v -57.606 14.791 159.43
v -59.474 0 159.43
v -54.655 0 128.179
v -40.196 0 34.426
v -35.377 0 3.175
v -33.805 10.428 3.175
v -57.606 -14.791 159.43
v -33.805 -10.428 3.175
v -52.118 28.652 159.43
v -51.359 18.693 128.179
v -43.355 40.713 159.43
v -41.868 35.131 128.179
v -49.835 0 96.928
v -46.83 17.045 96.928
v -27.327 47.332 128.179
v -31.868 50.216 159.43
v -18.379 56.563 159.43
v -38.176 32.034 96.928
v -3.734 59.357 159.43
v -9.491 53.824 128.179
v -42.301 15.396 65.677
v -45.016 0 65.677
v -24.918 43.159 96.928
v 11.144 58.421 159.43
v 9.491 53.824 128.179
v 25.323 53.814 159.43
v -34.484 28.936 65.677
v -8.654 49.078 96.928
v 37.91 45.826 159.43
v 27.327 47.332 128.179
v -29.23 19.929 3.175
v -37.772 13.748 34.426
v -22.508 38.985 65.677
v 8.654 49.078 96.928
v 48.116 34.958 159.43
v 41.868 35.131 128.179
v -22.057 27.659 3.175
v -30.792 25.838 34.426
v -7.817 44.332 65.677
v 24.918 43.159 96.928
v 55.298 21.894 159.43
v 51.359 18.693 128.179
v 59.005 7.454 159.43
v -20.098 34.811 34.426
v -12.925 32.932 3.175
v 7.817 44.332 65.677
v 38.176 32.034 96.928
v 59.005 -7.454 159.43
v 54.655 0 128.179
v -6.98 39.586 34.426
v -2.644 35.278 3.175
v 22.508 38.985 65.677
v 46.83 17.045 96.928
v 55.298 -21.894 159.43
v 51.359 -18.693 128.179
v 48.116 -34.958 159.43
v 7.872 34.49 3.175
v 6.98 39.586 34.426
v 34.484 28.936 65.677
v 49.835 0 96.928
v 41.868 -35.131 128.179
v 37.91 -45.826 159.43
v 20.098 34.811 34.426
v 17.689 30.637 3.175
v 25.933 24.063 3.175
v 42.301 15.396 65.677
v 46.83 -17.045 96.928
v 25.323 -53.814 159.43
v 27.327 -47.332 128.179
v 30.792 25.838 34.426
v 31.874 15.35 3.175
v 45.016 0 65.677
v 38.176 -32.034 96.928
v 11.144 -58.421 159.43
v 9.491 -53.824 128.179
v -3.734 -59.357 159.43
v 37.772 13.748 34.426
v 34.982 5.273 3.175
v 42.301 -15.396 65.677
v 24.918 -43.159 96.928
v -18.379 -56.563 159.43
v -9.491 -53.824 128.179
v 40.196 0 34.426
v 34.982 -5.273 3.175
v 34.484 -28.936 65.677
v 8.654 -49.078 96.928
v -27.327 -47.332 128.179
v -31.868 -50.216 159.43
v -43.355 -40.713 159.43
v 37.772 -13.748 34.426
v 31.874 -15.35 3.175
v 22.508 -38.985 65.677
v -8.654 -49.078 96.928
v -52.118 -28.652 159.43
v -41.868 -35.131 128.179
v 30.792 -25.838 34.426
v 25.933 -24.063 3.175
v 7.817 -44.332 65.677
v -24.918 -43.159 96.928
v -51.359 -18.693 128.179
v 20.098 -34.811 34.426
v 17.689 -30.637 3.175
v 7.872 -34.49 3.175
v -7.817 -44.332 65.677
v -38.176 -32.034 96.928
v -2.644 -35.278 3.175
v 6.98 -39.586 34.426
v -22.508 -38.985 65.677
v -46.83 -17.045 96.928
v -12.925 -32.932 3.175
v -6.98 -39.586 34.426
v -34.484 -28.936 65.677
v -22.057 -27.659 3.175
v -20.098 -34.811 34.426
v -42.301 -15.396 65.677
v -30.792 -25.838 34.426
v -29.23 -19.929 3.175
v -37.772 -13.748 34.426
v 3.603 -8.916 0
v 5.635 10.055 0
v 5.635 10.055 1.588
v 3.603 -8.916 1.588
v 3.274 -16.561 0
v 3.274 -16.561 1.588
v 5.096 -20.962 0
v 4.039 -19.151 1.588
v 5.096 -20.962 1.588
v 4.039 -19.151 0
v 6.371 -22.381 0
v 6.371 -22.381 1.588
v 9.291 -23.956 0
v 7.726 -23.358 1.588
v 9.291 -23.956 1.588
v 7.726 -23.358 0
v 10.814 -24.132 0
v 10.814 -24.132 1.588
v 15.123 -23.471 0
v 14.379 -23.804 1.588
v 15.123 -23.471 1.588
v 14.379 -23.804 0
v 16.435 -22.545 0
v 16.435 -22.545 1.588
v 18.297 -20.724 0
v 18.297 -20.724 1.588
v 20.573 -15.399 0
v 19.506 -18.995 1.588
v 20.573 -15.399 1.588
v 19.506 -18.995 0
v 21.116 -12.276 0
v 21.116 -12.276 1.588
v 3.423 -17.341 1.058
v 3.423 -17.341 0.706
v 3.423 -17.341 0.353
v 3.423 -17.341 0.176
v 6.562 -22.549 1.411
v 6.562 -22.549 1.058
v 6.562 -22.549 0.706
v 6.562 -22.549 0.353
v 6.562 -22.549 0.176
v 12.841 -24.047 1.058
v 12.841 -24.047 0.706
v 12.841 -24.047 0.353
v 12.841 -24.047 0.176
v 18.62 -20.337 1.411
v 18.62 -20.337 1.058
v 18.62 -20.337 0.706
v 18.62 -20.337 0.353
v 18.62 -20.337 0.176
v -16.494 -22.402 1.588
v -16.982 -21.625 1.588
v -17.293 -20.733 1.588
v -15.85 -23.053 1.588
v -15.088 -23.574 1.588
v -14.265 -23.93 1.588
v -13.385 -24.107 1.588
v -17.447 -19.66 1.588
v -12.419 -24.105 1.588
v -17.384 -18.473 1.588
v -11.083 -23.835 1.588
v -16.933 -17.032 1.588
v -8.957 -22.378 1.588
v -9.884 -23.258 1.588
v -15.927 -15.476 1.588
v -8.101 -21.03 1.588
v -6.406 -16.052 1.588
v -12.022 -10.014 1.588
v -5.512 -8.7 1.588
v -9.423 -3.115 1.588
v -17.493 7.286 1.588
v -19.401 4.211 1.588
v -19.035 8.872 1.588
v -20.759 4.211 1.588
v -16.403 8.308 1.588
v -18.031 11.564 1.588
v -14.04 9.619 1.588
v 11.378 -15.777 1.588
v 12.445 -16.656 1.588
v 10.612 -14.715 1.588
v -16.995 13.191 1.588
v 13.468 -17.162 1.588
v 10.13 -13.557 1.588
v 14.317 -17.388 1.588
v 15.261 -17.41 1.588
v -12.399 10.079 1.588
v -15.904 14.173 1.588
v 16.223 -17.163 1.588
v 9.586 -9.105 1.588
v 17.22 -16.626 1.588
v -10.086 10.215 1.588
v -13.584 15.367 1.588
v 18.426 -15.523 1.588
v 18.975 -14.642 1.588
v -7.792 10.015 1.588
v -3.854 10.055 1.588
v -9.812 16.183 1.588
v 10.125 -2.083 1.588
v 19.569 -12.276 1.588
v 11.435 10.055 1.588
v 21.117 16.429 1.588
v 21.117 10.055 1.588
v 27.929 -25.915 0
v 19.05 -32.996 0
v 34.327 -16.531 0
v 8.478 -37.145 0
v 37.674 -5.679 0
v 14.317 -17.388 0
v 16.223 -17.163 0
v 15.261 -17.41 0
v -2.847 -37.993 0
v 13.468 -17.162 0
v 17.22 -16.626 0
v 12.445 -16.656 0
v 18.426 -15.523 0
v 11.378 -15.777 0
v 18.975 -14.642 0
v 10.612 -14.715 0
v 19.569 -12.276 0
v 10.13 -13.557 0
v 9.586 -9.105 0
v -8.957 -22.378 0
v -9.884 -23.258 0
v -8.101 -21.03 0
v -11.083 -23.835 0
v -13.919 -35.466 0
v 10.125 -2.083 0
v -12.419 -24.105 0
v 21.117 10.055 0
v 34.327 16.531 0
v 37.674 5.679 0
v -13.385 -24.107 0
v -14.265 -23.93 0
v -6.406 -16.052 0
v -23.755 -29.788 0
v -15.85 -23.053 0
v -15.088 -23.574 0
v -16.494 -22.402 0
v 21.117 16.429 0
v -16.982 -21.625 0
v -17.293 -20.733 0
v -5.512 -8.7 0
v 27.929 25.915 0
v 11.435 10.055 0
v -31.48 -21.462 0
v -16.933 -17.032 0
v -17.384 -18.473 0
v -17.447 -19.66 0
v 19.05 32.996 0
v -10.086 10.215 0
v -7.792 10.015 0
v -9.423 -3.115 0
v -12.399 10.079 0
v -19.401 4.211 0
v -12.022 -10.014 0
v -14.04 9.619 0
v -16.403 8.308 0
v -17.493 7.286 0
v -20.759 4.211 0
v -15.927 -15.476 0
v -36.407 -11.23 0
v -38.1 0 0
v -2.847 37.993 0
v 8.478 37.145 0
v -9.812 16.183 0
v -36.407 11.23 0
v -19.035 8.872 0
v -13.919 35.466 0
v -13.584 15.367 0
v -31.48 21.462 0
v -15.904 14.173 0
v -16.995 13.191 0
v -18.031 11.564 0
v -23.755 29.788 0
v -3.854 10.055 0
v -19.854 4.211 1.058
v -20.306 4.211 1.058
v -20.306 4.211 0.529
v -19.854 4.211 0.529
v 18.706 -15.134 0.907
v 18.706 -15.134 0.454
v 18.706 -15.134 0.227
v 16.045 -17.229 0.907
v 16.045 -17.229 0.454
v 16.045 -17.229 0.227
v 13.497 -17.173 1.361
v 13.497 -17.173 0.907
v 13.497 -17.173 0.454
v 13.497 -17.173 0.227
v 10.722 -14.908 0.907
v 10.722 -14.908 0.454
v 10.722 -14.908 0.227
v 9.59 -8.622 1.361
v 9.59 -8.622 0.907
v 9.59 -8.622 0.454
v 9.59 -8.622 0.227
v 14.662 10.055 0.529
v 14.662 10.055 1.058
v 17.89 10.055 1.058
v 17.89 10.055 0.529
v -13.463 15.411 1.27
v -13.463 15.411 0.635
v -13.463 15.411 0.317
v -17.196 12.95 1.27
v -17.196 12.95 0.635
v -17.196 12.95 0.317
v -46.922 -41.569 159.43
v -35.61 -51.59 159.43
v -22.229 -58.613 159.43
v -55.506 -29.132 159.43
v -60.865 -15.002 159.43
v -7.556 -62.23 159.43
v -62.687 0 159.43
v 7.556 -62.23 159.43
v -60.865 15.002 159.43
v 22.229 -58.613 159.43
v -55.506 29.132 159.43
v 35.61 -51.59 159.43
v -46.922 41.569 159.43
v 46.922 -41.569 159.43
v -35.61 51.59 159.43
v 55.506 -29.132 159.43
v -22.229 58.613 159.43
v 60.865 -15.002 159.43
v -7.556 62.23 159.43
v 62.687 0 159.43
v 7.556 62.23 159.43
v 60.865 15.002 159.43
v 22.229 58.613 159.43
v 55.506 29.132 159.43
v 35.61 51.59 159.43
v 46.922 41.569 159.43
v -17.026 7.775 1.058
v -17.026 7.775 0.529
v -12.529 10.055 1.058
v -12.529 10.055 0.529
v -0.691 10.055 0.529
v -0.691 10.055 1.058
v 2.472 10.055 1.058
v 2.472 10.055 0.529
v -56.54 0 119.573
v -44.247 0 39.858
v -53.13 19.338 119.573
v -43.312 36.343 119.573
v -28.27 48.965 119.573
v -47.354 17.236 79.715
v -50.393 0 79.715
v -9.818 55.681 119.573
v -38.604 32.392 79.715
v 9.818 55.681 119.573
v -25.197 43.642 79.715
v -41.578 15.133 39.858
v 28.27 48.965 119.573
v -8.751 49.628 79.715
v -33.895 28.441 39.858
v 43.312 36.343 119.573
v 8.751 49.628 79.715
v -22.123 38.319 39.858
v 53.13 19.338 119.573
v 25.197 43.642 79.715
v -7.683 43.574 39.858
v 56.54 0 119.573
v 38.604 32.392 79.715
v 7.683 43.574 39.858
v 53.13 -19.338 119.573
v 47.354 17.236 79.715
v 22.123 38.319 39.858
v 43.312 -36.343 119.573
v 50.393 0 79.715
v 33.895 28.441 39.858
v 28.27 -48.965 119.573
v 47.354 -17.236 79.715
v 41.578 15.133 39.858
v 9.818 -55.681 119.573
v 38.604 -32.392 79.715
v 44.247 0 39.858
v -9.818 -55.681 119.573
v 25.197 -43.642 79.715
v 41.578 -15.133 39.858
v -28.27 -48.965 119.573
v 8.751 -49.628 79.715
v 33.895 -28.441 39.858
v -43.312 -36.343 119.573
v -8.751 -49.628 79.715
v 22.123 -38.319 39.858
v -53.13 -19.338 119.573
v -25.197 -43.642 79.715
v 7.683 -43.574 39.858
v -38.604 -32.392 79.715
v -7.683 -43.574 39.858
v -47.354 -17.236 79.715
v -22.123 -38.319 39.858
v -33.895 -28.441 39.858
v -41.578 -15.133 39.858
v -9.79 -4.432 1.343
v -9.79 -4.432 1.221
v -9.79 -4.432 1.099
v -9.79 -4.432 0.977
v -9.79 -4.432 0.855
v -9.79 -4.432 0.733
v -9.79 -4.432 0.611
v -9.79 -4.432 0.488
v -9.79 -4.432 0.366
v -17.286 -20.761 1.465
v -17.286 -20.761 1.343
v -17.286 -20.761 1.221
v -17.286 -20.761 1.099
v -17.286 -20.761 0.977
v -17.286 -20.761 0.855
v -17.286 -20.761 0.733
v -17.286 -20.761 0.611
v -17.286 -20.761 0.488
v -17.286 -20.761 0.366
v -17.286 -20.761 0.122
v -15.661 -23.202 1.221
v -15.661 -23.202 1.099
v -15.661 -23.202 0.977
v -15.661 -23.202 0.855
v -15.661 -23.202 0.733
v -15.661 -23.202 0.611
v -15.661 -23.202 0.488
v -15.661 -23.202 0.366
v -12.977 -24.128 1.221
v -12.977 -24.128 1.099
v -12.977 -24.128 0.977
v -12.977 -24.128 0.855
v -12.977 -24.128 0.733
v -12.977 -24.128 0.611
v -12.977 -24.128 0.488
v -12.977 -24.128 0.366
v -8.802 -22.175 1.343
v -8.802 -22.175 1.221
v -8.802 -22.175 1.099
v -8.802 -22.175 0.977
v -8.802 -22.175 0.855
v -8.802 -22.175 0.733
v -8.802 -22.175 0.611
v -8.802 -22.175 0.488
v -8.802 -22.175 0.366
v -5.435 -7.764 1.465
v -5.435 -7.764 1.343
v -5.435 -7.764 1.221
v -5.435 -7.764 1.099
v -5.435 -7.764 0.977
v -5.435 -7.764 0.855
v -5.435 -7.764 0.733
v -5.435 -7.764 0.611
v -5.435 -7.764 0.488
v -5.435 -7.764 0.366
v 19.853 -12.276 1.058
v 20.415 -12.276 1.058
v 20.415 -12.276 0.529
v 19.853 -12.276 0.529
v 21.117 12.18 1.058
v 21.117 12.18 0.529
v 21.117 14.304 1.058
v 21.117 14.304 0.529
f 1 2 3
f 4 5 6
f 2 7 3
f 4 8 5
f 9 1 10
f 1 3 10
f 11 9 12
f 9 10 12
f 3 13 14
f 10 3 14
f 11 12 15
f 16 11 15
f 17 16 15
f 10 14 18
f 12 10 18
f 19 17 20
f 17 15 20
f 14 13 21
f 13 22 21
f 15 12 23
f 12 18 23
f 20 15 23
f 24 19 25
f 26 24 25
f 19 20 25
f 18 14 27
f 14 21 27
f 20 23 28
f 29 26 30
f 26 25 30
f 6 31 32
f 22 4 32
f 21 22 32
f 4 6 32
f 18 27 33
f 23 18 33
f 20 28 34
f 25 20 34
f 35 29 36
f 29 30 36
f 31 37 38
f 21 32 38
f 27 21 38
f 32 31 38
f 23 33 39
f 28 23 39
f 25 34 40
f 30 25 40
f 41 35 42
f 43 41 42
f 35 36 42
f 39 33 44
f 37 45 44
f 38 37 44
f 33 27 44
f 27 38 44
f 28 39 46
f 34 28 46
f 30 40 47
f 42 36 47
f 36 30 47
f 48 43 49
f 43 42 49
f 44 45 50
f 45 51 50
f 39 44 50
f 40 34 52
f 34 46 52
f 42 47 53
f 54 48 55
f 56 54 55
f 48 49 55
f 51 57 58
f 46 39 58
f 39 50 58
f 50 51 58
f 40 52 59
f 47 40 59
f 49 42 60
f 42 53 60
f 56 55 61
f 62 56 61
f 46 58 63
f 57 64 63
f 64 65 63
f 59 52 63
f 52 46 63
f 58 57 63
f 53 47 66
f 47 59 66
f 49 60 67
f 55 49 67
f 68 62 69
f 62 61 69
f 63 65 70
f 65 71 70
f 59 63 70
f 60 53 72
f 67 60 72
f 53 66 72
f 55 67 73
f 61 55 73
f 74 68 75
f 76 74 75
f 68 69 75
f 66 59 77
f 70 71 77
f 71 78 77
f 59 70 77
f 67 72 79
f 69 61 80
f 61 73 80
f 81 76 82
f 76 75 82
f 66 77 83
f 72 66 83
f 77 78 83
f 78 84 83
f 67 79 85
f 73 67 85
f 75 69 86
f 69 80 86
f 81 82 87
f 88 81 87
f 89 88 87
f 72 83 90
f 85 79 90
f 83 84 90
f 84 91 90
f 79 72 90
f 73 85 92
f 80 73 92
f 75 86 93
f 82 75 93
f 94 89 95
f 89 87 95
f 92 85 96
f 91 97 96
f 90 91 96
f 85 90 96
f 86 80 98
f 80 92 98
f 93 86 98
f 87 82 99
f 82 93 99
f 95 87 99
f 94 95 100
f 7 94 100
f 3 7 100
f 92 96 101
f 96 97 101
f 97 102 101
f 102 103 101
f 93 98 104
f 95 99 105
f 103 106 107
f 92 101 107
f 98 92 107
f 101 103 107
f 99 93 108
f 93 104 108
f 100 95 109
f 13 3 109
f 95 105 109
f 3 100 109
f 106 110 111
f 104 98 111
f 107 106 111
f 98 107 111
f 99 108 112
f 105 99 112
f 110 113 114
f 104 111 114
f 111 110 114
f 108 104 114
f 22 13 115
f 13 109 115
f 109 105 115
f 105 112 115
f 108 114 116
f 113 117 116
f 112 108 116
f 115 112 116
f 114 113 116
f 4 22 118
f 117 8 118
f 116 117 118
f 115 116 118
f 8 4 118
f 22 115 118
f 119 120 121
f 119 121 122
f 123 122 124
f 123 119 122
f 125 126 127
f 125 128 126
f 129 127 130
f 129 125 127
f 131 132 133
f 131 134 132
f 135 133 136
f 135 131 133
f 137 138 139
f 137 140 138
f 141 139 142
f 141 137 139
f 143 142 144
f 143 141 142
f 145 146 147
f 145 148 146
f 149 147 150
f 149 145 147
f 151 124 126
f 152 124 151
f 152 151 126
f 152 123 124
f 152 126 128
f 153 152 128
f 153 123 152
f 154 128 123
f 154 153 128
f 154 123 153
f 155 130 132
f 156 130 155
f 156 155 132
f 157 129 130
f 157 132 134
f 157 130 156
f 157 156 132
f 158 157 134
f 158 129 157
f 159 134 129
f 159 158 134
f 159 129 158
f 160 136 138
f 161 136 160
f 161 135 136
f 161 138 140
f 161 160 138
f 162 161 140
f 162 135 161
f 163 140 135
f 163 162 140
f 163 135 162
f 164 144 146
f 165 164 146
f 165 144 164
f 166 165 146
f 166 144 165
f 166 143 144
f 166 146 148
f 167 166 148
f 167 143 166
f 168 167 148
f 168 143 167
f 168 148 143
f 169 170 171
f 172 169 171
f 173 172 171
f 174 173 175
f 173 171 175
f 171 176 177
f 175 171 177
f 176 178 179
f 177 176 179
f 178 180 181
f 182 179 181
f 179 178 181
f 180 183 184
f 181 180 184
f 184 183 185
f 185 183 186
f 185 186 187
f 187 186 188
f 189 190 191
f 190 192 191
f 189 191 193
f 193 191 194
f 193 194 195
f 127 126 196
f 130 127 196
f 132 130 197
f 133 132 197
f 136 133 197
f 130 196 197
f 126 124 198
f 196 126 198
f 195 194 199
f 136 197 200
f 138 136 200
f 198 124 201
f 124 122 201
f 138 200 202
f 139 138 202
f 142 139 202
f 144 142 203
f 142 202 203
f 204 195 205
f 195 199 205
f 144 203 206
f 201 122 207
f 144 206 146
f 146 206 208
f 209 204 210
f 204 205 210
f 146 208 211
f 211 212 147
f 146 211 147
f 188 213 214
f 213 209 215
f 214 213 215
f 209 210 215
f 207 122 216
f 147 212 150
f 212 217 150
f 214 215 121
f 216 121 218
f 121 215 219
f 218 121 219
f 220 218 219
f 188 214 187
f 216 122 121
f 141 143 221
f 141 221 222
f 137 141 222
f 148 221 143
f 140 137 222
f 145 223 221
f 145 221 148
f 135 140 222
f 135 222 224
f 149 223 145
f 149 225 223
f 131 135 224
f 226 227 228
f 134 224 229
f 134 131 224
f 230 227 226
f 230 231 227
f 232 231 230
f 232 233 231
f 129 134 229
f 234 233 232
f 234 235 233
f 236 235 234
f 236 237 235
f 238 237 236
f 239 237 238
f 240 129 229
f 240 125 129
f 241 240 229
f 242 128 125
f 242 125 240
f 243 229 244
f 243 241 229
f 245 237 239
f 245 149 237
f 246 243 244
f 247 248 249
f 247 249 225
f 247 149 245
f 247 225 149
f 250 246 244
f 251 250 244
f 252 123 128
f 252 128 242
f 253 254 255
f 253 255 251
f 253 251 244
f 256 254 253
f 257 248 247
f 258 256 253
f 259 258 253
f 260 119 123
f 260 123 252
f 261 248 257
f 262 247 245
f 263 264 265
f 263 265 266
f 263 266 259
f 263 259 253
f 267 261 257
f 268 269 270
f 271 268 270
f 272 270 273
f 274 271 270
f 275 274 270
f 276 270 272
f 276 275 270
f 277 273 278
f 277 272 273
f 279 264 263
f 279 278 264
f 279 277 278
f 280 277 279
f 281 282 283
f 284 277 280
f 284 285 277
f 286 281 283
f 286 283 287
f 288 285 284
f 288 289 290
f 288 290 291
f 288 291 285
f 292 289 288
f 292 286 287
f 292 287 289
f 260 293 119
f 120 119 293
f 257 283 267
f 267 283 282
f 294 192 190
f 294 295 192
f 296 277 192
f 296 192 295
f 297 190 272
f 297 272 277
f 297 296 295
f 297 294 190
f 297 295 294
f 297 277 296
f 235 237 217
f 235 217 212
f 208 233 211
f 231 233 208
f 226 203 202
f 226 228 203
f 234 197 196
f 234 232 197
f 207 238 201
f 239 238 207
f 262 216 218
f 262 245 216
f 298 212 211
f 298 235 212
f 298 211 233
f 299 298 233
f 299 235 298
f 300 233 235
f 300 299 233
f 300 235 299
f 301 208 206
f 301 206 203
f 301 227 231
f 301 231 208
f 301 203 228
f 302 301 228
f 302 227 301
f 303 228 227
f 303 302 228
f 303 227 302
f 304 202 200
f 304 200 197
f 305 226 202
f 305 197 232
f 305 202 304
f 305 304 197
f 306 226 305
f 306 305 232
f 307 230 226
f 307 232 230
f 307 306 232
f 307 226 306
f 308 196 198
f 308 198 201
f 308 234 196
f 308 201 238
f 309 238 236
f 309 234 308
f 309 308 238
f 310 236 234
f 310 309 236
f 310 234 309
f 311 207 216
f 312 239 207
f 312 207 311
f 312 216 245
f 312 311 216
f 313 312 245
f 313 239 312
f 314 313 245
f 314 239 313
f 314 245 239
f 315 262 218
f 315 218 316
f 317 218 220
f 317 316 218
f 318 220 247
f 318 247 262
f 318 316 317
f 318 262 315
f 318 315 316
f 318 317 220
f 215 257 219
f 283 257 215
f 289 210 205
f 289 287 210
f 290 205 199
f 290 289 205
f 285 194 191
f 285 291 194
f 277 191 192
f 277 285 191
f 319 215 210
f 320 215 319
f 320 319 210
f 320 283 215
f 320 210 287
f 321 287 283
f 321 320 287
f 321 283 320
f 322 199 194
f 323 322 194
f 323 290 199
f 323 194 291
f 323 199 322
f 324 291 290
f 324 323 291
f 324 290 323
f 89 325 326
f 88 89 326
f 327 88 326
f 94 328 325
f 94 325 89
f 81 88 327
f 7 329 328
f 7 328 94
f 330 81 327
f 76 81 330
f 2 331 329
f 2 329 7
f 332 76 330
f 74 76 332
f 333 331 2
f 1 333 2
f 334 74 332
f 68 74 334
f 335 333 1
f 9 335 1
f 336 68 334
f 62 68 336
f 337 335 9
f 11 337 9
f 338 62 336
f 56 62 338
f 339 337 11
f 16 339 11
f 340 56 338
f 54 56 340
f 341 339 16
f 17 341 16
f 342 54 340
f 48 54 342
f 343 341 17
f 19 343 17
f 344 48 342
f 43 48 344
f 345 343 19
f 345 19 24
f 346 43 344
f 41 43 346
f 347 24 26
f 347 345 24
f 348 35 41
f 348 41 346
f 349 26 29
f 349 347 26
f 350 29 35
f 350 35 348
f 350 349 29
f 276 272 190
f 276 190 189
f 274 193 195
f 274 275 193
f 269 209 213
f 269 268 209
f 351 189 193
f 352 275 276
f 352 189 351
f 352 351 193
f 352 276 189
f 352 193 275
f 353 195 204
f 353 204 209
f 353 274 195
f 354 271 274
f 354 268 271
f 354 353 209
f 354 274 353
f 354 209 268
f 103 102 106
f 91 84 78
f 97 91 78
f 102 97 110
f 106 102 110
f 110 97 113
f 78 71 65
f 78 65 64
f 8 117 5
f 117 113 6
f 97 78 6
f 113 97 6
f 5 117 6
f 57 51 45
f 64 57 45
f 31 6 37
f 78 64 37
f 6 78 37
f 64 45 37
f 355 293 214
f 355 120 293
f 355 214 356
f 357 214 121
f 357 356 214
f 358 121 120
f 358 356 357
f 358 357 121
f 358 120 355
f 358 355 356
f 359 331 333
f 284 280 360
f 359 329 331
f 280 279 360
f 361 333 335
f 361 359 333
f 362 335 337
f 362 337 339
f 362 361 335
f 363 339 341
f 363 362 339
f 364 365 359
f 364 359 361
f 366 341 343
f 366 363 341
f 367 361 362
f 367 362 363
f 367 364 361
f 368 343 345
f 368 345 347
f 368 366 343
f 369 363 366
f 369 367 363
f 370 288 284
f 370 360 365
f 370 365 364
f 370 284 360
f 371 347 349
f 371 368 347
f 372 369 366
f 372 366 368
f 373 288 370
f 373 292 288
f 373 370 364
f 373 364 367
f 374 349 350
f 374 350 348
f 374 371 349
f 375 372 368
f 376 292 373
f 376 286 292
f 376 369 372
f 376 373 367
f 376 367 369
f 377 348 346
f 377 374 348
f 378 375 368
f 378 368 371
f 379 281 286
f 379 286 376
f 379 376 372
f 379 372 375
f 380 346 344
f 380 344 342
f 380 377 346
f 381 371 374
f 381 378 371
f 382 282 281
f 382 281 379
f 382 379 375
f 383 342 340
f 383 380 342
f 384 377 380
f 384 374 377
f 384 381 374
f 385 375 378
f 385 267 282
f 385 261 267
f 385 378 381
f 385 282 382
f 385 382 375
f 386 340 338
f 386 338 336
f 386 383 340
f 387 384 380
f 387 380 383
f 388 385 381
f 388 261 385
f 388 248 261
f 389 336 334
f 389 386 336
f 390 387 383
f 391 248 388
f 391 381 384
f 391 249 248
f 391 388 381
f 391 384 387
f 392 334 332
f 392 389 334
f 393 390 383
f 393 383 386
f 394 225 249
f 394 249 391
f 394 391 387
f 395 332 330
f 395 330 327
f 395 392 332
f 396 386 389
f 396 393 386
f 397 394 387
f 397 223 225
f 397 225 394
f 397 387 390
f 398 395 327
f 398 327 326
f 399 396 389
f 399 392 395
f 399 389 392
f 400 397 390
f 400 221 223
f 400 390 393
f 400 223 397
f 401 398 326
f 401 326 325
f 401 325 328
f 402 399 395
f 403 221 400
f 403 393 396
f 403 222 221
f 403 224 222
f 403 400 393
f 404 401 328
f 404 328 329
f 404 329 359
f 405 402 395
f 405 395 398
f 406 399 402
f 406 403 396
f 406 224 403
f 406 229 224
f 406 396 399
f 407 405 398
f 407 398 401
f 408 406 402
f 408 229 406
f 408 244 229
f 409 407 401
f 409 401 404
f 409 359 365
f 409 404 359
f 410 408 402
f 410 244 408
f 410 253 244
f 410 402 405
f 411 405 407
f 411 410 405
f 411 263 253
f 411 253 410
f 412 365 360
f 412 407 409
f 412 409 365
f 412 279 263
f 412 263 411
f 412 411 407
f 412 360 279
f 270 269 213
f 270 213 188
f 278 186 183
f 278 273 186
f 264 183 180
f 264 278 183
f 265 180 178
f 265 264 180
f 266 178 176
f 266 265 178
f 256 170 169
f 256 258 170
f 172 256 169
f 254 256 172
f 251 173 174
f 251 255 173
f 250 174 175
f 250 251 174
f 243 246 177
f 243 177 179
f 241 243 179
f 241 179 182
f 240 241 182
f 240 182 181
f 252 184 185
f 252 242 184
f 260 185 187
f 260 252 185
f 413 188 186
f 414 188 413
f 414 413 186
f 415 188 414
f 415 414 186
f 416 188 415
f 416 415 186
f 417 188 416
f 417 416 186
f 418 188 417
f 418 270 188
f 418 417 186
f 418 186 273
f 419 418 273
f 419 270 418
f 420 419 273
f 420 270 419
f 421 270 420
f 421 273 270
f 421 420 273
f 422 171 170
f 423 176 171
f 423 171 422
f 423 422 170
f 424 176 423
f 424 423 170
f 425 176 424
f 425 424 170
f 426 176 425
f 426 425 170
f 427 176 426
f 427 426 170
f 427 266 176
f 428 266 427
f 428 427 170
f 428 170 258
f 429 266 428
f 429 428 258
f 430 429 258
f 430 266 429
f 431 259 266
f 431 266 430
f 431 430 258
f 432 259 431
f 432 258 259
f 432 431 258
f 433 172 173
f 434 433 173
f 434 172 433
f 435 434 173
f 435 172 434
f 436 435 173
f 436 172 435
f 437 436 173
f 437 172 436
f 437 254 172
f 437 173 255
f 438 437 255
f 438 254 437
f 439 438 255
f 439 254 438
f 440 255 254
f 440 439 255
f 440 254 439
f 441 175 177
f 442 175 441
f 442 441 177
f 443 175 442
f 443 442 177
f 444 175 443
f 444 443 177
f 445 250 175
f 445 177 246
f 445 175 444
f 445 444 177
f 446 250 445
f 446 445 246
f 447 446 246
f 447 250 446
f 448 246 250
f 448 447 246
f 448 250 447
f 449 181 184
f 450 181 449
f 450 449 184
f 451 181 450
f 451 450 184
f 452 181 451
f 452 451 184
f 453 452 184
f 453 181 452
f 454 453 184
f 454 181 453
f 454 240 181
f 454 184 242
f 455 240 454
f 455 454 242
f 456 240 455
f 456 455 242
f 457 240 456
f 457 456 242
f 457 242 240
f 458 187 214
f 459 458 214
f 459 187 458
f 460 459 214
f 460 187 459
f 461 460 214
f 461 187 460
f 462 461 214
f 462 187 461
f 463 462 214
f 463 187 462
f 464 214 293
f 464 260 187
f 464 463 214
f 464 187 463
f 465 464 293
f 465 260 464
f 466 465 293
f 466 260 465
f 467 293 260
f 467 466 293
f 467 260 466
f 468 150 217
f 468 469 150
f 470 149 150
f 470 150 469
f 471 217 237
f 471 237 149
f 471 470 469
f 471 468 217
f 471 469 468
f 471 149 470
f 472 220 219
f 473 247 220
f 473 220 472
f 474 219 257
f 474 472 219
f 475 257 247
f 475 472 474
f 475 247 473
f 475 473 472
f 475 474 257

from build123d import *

# Parameters (mm, degrees)
F2_T     = -3.175
F4_DEPTH = 1.5875


with BuildPart() as f1:
    # F0 (on Front) → F1 (revolve)
    with BuildSketch(Plane.XZ):
        Polygon((-38.1, 0), (0, 0), (0, 159.4304591417), (-62.6866146922, 159.4304591417), align=None)
    revolve(axis=Axis((0, 0, 79.7152295709), (0, 0, -1)))

    # F2
    f2_openings = [f1.faces().sort_by_distance(p)[0] for p in [
        (0, 0, 159.430459),
    ]]
    offset(amount=F2_T, openings=f2_openings)

    # F3 (on Top) → F4 (cut)
    with BuildSketch(Plane.XY):
        with BuildLine():
            add(Edge.make_bspline(
                [(-19.4014832377, 4.2113135569), (-18.7531898055, 5.4777192579), (-17.4014889021, 8.1181929151), (-12.5510655032, 10.5482010959), (-9.3620261804, 10.190664987), (-7.7923568897, 10.0146830082)],
                knots=[0, 0, 0, 0, 0.318803598, 0.6647099753, 1, 1, 1, 1], degree=3))
            add(Edge.make_bspline(
                [(-7.7923568897, 10.0146830082), (-7.9133892647, 7.7789314659), (-8.1642059751, 3.1457591674), (-9.4585773774, -4.4941025574), (-12.891941134, -12.5420703822), (-17.5861383279, -16.7926160144), (-17.5102852366, -20.7671425935), (-16.4796150747, -22.6430773976), (-14.8305156939, -23.8501410331), (-12.9807029748, -24.2714401619), (-10.5467395482, -23.8279743211), (-8.4582492729, -22.2675558352), (-6.1108322547, -16.5517126321), (-5.438963665, -7.3460077185), (-4.4365950396, 3.6569436415), (-3.853734117, 10.0549794734)],
                knots=[0, 0, 0, 0, 0.0880409595, 0.1824482404, 0.2824178019, 0.3656698949, 0.4286344499, 0.4769656385, 0.5238340761, 0.5699241603, 0.6214860687, 0.6740104117, 0.754350396, 0.8571587825, 1, 1, 1, 1], degree=3))
            add(Edge.make_bspline(
                [(-3.853734117, 10.0549794734), (-0.6908265253, 10.0549794734), (2.4720810664, 10.0549794734), (5.6349886581, 10.0549794734)],
                knots=[0, 0, 0, 0, 9.4887227751, 9.4887227751, 9.4887227751, 9.4887227751], degree=3))
            add(Edge.make_bspline(
                [(5.6349886581, 10.0549794734), (5.1179656529, 4.2988011186), (4.1855989826, -6.0815277883), (2.2418363662, -17.133074814), (6.1993286809, -22.8137367886), (9.6258734077, -24.3046887574), (12.8862283177, -24.0371426728), (15.1074594417, -23.8919320147), (19.0561707704, -20.2535401147), (20.3748776318, -17.2807457035), (21.0926160049, -12.3105993929), (21.1163228045, -12.2759174556)],
                knots=[0, 0, 0, 0, 0.1918449829, 0.3459611394, 0.461688353, 0.5500217309, 0.6322196488, 0.7017930408, 0.8051710251, 0.9007838703, 0.9983000374, 0.9983000374, 0.9983000374, 0.9983000374], degree=3))
            add(Edge.make_bspline(
                [(21.1163228045, -12.2759174556), (20.3916681002, -12.2759174556), (19.6672989739, -12.2759174556), (19.5691268891, -12.2759174556)],
                knots=[0.0004126536, 0.0004126536, 0.0004126536, 0.0004126536, 0.9048401528, 0.9048401528, 0.9048401528, 0.9048401528], degree=3))
            add(Edge.make_bspline(
                [(19.5691268891, -12.2759174556), (19.418191644, -13.2654511474), (19.1064893287, -15.3089761217), (16.123951194, -17.5847200897), (13.3802481357, -17.4290693932), (9.9866685411, -15.0695037941), (9.2467731261, -8.3072976675), (10.5787837329, 1.0040330336), (11.1519221552, 7.0625804664), (11.4350030199, 10.0549794734)],
                knots=[0, 0, 0, 0, 0.1099798537, 0.2271237245, 0.3287414252, 0.4492038413, 0.610060749, 0.8074036986, 1, 1, 1, 1], degree=3))
            add(Edge.make_bspline(
                [(11.4350030199, 10.0549794734), (14.6624402454, 10.0549794734), (17.8898774708, 10.0549794734), (21.1173146963, 10.0549794734)],
                knots=[0, 0, 0, 0, 9.6823116764, 9.6823116764, 9.6823116764, 9.6823116764], degree=3))
            add(Edge.make_bspline(
                [(21.1173146963, 10.0549794734), (21.1173146963, 12.1795317779), (21.1173146963, 14.3040840824), (21.1173146963, 16.428636387)],
                knots=[0, 0, 0, 0, 6.3736569136, 6.3736569136, 6.3736569136, 6.3736569136], degree=3))
            add(Edge.make_bspline(
                [(21.1173146963, 16.428636387), (10.6683538258, 16.5466721162), (-5.2496723323, 16.7264886403), (-13.2144965635, 15.9136449775), (-17.6553820034, 13.2925715926), (-19.0221552591, 8.7173019267), (-20.1733487063, 5.7306348498), (-20.7589622587, 4.2113135569)],
                knots=[0, 0, 0, 0, 0.3620561729, 0.551559117, 0.6983516808, 0.8465511212, 1, 1, 1, 1], degree=3))
            add(Edge.make_bspline(
                [(-20.7589622587, 4.2113135569), (-20.3064692517, 4.2113135569), (-19.8539762447, 4.2113135569), (-19.4014832377, 4.2113135569)],
                knots=[0, 0, 0, 0, 1.357479021, 1.357479021, 1.357479021, 1.357479021], degree=3))
        make_face()
    extrude(amount=F4_DEPTH, mode=Mode.SUBTRACT)


solid = f1.part
